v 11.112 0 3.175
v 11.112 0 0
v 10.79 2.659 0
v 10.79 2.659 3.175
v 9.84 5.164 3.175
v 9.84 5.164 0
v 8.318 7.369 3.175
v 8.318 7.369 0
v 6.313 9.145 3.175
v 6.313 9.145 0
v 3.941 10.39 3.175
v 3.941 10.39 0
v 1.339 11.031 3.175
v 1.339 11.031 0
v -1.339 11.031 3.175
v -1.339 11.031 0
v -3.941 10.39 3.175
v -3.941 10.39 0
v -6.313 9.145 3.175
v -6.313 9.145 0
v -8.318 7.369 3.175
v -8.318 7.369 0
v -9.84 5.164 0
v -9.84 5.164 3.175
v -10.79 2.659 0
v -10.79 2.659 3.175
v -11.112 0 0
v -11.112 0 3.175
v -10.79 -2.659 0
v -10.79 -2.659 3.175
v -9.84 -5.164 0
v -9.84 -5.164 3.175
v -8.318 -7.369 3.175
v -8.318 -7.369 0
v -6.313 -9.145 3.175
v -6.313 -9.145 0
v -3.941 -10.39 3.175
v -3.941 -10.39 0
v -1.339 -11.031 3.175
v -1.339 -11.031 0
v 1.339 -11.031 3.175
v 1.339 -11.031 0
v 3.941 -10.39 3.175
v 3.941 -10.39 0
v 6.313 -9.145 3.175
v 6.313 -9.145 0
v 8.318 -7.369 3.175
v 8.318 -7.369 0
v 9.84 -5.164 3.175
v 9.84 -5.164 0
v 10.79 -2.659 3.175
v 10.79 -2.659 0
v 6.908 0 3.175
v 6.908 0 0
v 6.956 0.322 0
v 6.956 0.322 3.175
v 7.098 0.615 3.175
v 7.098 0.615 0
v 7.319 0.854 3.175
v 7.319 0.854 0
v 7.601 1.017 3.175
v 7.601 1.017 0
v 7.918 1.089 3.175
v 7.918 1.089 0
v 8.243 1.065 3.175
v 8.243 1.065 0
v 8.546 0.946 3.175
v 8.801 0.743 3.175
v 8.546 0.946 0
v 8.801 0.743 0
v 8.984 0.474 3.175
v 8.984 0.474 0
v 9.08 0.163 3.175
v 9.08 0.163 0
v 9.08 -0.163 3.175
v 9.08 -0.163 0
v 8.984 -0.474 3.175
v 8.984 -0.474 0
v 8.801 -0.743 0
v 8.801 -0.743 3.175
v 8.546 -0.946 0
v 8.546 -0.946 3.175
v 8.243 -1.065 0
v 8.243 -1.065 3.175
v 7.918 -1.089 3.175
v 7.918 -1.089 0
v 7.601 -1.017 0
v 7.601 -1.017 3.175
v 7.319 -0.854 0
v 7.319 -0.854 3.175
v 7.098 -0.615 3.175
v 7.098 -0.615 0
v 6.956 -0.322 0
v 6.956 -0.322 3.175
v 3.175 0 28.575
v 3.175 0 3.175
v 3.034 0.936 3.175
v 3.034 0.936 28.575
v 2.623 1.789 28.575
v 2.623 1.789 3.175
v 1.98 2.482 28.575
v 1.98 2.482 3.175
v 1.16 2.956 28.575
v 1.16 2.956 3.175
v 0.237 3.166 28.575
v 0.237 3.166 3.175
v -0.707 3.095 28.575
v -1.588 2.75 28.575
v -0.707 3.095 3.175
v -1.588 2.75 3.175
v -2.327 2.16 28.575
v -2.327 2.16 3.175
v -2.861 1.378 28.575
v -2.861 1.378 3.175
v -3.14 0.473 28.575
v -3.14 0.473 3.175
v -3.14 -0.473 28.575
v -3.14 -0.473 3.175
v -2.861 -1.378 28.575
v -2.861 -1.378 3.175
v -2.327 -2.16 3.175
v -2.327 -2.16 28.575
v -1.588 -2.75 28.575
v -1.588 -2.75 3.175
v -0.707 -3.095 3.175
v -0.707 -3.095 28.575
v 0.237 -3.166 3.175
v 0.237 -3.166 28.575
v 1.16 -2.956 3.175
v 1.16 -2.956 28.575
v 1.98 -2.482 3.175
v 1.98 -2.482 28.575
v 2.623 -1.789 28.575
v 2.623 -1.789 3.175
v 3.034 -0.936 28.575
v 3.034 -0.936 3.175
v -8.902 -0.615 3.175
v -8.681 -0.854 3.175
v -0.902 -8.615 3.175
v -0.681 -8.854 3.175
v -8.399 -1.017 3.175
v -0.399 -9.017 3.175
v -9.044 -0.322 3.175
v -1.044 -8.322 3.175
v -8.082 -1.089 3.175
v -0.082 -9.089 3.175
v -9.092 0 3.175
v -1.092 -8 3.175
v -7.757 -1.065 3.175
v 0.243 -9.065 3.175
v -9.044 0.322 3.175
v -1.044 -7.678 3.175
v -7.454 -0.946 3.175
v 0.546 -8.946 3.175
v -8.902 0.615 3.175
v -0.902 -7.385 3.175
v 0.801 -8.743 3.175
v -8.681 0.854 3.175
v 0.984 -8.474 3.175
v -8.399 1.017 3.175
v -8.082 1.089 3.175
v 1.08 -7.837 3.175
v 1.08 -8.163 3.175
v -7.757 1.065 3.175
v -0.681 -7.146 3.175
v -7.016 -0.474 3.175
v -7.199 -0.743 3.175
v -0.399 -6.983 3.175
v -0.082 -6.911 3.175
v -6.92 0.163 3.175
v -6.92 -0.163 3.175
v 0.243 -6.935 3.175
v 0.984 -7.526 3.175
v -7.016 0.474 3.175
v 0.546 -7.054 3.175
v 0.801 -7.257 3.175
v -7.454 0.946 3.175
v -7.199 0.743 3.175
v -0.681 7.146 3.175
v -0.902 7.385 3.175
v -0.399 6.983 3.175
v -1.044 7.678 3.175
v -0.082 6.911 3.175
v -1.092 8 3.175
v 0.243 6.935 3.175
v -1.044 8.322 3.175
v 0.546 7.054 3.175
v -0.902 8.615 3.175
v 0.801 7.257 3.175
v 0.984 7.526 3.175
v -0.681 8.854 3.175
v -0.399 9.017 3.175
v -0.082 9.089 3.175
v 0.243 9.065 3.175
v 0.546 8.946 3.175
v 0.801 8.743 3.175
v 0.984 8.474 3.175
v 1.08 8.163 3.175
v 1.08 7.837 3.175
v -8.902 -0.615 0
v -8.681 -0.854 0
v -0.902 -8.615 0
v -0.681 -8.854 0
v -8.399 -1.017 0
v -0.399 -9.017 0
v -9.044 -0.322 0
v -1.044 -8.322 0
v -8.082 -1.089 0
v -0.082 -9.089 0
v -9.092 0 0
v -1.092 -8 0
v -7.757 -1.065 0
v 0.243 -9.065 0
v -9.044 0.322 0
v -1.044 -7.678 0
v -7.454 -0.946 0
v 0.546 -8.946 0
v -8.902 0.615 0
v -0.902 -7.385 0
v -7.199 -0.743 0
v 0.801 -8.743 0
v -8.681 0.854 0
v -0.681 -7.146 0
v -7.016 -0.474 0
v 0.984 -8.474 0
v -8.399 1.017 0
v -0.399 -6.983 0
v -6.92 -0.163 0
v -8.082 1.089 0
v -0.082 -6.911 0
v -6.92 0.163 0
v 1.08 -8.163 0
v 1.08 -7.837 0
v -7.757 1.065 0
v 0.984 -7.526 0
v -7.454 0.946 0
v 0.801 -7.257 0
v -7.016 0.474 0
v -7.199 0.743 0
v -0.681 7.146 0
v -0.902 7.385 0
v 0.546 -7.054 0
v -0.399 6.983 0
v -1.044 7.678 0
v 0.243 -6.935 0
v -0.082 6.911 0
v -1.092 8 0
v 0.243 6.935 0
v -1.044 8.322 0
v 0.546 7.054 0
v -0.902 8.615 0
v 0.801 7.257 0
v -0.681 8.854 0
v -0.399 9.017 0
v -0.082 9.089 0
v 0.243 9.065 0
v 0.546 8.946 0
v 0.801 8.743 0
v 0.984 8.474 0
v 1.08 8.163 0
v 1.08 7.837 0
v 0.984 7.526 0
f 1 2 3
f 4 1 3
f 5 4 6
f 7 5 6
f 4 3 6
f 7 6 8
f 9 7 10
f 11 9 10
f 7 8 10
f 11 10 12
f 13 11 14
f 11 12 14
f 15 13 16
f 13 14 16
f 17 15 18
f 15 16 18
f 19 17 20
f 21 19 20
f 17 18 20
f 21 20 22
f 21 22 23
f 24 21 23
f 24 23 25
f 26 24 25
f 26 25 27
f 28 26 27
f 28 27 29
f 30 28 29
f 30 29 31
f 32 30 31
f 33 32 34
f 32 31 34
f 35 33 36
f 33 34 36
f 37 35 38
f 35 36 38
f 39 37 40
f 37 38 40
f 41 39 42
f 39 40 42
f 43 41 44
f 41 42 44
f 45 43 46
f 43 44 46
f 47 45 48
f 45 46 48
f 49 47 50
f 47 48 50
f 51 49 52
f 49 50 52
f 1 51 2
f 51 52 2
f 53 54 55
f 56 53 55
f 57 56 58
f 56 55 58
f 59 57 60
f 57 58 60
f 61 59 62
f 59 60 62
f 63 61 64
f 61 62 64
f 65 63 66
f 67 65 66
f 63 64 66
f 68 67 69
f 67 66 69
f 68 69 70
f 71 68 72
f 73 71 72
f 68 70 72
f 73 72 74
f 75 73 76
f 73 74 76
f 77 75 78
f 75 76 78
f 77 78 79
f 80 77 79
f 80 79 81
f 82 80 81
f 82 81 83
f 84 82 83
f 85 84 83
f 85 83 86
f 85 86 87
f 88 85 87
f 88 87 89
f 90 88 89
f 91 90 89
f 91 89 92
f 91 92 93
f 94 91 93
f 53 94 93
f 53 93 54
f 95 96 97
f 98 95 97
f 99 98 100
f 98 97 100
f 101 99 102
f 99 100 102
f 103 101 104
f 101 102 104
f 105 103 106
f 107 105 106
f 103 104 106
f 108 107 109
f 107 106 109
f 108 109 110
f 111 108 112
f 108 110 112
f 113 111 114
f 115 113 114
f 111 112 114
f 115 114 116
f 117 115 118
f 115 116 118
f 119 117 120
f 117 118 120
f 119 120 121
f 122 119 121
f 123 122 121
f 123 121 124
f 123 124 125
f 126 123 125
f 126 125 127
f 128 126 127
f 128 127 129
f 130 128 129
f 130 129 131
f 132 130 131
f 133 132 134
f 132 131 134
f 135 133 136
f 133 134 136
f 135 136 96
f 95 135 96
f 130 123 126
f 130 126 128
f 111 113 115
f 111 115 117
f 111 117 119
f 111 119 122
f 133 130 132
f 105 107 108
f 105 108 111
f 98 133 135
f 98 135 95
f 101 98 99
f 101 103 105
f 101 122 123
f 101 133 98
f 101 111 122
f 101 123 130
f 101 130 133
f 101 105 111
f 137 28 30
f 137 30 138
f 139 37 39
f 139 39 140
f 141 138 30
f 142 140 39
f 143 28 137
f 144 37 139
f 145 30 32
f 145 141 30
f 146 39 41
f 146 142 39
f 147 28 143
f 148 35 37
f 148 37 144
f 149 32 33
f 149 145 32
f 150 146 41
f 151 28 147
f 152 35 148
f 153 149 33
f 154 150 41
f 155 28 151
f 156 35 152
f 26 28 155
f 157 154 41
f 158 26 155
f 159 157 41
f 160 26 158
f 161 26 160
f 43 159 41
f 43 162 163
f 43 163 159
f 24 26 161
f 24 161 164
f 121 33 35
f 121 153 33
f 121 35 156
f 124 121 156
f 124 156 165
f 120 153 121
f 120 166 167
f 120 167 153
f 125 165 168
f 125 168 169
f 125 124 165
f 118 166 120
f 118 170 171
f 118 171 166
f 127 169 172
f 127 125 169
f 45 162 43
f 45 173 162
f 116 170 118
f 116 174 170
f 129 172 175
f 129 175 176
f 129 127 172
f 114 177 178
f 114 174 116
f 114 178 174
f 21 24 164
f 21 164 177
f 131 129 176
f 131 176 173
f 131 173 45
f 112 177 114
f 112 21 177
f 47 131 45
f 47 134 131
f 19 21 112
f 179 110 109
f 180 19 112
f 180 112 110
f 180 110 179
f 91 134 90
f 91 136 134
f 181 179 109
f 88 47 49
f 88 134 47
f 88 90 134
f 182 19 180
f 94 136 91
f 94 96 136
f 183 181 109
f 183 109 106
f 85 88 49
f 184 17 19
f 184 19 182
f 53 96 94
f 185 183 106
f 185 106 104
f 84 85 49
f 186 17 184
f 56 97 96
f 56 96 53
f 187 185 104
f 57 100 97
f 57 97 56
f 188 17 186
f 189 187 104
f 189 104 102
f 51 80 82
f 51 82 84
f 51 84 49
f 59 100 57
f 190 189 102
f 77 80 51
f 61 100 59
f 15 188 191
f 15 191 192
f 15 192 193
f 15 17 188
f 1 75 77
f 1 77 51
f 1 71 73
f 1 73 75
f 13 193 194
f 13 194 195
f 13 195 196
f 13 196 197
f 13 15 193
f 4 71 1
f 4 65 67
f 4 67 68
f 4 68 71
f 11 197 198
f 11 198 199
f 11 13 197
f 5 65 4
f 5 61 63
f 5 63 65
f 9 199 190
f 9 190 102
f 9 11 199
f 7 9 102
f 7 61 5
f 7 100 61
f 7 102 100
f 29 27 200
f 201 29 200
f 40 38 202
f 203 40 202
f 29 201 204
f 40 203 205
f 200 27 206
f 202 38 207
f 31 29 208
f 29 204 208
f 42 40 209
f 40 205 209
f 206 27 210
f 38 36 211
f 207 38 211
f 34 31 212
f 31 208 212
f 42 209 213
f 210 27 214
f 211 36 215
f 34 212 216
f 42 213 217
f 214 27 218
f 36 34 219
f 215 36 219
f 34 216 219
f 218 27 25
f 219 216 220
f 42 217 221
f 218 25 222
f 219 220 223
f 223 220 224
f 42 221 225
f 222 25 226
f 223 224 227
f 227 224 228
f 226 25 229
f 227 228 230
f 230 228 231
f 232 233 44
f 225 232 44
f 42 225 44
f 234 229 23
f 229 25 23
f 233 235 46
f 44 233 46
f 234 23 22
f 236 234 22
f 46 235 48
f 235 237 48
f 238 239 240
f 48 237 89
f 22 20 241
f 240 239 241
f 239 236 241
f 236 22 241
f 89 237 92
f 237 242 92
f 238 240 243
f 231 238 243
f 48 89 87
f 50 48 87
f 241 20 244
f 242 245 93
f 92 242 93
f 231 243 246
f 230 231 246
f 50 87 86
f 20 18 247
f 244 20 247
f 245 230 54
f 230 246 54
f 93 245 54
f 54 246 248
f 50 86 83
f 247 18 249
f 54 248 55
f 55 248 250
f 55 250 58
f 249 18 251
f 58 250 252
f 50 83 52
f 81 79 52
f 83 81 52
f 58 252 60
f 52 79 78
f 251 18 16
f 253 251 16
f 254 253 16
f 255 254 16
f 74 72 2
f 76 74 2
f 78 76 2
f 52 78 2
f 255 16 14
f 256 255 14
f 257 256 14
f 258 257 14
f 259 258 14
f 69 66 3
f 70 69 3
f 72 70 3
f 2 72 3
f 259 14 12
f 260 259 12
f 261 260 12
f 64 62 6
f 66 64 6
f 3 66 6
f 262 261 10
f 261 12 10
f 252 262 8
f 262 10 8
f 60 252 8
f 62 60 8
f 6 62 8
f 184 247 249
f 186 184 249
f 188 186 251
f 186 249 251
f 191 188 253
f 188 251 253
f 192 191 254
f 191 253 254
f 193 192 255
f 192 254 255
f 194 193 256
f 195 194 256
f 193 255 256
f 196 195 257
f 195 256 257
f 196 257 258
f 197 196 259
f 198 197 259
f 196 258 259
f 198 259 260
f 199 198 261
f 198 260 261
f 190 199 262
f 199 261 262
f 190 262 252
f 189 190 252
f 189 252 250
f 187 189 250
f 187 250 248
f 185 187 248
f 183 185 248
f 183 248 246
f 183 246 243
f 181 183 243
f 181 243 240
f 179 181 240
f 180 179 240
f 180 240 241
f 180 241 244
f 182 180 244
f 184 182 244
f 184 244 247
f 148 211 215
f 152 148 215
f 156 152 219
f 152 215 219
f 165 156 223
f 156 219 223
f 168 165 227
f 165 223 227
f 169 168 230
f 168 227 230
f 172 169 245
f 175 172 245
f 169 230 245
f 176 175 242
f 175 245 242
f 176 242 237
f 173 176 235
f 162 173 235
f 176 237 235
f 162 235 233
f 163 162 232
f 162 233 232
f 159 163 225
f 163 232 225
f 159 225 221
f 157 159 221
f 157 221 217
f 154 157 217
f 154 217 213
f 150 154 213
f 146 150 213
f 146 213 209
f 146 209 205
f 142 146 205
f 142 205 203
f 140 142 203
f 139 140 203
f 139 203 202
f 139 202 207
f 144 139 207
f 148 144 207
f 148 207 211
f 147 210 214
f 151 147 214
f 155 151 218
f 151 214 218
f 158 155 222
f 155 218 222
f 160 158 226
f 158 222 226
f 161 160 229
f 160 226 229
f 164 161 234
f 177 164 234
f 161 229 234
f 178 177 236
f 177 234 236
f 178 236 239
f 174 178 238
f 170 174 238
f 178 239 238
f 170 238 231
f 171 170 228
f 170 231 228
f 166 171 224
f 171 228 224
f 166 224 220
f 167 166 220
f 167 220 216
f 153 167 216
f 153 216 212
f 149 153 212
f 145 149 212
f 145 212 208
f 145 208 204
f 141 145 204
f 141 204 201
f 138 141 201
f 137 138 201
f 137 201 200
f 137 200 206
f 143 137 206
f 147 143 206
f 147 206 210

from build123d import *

# Parameters (mm, degrees)
SKETCH1_R                   = 11.1125
BOSS_EXTRUDE1_DEPTH         = 3.175
SKETCH2_R                   = 3.175
BOSS_EXTRUDE2_DEPTH         = 25.4
F_44_0_086_DIAMETER_HOLE1_D = 2.1844


with BuildPart() as part:
    # Sketch1 → Boss-Extrude1 (new body)
    with BuildSketch(Plane.XY):
        Circle(SKETCH1_R)
    extrude(amount=BOSS_EXTRUDE1_DEPTH)

    # Sketch2 → Boss-Extrude2 (add)
    with BuildSketch(Plane.XY.offset(3.175)):
        Circle(SKETCH2_R)
    extrude(amount=BOSS_EXTRUDE2_DEPTH)

    # #44 (0.086) Diameter Hole1 (through all)
    with Locations(Plane.XY.offset(3.175)):
        with Locations((0, 8), (0, -8), (-8, 0), (8, 0)):
            Hole(F_44_0_086_DIAMETER_HOLE1_D / 2)


solid = part.part
